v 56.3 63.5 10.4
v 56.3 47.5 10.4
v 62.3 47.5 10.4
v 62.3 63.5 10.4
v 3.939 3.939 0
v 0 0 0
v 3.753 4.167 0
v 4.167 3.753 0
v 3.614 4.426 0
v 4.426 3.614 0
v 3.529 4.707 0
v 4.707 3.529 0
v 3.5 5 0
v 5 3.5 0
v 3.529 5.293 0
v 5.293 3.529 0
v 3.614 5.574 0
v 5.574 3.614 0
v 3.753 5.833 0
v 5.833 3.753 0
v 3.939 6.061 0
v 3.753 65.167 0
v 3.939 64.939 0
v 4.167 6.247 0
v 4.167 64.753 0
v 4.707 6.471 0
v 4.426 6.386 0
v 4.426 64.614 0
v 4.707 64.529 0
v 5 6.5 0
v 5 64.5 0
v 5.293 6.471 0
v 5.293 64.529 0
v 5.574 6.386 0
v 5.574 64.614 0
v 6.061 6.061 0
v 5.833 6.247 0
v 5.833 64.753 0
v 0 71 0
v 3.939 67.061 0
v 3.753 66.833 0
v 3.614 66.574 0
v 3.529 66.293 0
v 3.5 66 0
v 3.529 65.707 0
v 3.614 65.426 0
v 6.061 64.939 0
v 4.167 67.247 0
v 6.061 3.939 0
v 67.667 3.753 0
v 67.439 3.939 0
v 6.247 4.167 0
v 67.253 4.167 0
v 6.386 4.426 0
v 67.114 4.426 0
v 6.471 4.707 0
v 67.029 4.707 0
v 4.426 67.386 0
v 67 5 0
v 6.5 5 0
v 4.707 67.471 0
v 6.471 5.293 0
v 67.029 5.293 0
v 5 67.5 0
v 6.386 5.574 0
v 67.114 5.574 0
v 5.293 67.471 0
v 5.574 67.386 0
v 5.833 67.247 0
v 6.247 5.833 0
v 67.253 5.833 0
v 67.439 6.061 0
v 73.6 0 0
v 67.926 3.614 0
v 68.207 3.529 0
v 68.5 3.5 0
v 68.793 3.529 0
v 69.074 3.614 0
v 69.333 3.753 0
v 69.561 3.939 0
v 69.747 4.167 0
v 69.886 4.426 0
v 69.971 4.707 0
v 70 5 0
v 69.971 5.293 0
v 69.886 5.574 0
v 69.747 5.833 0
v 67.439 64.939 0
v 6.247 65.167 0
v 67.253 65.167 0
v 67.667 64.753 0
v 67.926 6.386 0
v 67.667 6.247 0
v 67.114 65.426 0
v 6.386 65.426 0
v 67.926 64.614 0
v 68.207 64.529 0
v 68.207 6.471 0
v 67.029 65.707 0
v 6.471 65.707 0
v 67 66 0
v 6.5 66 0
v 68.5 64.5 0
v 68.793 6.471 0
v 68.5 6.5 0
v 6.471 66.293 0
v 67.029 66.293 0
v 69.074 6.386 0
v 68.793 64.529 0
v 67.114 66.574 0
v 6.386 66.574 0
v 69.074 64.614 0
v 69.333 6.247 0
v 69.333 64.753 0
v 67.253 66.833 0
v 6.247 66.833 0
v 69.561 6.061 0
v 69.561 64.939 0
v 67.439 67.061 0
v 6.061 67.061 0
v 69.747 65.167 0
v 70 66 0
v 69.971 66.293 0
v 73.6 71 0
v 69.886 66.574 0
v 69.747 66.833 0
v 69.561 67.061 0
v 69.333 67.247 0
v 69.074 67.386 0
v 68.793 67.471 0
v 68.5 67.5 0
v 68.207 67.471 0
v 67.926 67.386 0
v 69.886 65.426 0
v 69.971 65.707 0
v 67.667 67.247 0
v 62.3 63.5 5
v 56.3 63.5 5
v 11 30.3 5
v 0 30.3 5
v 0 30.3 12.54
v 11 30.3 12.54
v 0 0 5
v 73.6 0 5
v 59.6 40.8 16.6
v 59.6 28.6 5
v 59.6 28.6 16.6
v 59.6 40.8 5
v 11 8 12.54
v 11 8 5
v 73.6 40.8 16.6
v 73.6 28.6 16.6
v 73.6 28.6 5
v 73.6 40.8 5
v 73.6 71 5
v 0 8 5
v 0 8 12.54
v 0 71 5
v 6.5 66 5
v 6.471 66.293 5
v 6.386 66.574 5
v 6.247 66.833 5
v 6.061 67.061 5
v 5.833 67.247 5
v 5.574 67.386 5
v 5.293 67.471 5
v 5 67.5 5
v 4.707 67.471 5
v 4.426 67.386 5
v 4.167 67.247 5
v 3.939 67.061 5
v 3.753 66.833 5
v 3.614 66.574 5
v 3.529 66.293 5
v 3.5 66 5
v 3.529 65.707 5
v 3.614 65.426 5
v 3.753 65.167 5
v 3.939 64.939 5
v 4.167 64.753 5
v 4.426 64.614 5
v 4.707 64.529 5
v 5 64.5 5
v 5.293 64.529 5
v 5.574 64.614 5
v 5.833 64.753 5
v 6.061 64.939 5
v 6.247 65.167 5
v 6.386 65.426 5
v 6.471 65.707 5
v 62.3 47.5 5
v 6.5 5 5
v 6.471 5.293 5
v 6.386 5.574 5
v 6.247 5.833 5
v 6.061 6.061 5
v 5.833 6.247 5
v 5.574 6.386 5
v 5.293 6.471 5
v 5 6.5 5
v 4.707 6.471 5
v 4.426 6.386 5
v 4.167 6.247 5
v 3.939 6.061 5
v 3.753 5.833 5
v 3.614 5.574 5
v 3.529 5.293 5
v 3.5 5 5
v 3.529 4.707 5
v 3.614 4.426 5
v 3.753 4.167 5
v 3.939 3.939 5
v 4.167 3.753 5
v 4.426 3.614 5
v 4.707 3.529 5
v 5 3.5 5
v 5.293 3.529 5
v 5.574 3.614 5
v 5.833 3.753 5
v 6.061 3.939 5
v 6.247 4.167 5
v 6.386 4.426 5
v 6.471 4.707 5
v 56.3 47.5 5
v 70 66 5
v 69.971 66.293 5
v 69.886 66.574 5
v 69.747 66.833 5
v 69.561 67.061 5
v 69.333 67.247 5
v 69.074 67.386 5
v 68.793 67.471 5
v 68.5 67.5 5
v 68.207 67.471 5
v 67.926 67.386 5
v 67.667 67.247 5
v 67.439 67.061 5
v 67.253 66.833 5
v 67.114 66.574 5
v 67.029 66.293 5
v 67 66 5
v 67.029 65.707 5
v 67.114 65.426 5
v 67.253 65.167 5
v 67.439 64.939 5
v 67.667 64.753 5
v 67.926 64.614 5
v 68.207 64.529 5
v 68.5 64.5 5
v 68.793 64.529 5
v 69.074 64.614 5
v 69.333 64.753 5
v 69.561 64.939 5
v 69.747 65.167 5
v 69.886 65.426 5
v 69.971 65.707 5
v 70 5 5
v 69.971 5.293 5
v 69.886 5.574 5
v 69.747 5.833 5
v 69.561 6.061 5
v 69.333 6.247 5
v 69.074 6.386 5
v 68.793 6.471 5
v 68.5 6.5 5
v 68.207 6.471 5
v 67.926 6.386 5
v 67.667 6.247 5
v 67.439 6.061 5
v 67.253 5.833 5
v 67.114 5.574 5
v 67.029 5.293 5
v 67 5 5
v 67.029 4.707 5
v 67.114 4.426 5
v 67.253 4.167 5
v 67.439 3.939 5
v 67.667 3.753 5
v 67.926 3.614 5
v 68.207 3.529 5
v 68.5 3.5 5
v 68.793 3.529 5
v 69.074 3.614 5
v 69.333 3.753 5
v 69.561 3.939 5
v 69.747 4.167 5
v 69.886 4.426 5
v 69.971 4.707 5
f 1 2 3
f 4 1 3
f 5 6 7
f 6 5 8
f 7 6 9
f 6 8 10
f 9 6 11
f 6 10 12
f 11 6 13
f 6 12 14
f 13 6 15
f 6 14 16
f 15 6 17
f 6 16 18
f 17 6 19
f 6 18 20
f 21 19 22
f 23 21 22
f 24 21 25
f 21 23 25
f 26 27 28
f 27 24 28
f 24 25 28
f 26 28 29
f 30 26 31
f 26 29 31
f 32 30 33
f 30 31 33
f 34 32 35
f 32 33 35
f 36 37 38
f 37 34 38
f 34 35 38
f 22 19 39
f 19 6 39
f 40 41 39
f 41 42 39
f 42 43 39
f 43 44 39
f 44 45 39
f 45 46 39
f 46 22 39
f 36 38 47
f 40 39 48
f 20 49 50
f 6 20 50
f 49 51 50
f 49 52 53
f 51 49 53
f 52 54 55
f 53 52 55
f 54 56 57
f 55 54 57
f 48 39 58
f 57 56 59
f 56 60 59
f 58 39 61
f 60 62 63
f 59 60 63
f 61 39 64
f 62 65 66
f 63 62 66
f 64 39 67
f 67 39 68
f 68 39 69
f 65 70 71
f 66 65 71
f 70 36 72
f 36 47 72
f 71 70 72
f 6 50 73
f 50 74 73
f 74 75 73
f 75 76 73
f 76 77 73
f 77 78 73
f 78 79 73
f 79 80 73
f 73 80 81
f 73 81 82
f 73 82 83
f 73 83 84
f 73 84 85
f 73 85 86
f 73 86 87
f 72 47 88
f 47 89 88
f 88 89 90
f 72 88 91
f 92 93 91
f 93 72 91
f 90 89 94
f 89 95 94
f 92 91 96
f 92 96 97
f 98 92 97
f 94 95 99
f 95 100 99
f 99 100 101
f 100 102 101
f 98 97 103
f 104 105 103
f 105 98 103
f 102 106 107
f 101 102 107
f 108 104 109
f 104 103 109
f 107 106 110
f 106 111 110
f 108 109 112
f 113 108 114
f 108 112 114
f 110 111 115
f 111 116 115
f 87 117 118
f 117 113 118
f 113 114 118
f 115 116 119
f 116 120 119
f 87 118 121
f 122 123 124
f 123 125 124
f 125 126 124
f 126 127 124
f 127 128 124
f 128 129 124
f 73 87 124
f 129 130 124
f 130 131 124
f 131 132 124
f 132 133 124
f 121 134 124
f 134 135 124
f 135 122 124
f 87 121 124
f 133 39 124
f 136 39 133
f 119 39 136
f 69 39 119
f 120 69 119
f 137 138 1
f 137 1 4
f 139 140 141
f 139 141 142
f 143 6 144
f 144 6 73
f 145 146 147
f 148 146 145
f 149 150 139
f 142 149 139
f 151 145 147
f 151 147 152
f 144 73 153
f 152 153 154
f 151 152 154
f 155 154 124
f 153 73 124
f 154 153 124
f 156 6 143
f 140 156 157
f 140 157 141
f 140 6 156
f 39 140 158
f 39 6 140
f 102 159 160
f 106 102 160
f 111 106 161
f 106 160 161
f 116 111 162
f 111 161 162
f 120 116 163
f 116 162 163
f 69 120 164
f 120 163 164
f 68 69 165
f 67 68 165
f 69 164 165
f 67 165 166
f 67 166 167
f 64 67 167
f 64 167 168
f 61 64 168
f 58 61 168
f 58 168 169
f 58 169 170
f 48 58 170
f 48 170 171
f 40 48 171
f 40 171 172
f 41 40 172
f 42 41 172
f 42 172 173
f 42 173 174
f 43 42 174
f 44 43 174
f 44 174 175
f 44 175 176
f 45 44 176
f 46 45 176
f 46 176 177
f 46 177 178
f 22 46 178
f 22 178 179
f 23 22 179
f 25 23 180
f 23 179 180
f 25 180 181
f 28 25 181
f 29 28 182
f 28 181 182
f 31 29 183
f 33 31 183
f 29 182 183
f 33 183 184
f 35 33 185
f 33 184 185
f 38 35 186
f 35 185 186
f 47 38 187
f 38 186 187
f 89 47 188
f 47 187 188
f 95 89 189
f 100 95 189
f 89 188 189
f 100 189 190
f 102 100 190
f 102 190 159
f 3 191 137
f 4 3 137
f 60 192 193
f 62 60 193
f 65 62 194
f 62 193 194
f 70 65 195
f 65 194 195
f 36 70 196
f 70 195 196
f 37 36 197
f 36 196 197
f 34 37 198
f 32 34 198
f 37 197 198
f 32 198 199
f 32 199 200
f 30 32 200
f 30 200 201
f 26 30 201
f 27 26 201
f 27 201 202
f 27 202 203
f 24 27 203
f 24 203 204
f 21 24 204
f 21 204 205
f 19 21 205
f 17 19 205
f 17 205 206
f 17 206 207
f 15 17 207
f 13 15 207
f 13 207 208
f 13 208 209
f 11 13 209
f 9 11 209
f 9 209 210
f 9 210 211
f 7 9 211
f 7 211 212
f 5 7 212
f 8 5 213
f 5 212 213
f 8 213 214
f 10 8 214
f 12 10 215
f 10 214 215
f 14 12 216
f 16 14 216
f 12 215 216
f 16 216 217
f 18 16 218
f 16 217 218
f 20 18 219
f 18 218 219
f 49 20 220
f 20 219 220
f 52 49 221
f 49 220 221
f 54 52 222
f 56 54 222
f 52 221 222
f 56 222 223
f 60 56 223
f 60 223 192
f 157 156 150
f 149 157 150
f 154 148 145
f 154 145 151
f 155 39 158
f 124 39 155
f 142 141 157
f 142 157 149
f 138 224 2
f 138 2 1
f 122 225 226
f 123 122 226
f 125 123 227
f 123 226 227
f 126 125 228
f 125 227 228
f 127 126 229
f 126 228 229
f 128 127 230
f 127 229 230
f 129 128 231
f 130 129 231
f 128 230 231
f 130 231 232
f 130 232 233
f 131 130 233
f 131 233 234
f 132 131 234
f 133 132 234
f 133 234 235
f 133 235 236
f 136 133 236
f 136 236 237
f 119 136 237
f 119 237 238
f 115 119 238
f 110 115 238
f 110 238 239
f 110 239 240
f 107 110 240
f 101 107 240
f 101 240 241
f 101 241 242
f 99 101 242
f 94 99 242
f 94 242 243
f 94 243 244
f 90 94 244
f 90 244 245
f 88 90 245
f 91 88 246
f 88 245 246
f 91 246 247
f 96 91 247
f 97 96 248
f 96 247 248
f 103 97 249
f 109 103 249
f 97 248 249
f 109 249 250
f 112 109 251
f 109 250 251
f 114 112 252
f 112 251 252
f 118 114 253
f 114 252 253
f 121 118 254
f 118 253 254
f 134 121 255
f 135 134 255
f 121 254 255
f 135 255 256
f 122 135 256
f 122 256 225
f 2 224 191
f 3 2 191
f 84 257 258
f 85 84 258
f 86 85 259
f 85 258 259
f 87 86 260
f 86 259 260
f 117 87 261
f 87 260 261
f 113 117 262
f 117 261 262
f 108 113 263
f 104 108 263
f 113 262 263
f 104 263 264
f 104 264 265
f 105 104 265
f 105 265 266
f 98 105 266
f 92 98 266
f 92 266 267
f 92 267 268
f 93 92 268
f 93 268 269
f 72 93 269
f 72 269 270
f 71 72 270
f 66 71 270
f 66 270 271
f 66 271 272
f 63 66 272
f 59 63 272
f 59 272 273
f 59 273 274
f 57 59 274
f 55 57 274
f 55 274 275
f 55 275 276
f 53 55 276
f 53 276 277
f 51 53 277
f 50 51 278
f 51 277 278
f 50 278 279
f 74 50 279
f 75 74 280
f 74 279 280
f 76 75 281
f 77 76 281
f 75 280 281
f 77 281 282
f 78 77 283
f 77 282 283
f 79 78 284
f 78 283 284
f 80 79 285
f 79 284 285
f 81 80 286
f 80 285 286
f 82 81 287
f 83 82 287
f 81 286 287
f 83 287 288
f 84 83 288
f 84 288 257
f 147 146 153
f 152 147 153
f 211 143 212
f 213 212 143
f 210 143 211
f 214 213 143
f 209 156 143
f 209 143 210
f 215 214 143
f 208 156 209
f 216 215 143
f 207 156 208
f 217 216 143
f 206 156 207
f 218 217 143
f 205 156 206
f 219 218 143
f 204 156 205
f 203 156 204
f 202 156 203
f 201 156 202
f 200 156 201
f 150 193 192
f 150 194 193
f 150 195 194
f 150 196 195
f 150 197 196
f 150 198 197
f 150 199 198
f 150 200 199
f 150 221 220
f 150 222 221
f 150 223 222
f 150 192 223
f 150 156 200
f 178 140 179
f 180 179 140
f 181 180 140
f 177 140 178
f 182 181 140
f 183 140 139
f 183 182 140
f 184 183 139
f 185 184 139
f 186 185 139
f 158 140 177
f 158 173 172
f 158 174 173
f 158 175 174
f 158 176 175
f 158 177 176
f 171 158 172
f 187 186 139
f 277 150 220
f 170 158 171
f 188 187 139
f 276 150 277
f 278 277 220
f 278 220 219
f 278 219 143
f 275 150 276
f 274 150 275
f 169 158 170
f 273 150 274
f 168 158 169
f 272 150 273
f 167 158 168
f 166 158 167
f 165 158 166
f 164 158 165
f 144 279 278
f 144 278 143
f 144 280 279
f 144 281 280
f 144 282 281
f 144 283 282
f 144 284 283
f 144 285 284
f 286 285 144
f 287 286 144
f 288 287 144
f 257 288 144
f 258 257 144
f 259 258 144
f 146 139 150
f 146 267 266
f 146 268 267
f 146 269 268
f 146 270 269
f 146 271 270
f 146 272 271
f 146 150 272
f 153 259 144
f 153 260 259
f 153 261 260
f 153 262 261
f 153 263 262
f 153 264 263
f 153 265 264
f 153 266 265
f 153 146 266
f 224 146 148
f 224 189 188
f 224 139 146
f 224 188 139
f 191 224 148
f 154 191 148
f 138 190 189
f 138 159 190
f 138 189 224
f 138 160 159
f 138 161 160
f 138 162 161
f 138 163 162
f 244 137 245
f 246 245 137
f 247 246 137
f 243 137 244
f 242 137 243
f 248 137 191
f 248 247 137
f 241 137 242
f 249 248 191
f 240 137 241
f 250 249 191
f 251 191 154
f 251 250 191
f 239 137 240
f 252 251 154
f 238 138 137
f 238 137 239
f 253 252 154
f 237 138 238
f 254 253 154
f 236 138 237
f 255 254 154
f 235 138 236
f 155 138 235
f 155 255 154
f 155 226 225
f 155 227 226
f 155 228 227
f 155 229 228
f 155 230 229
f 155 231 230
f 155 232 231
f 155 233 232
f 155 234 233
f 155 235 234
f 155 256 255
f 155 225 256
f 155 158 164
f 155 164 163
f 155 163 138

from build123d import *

# Parameters (mm, degrees)
SKETCH1_W           = 73.6
SKETCH1_H           = 71
BOSS_EXTRUDE1_DEPTH = 5
SKETCH2_R           = 1.5
CUT_EXTRUDE1_DEPTH  = 6
SKETCH3_W           = 11
SKETCH3_H           = 22.3
BOSS_EXTRUDE2_DEPTH = 7.54
SKETCH4_W           = 14
SKETCH4_H           = 12.2
BOSS_EXTRUDE3_DEPTH = 11.6
SKETCH5_W           = 6
SKETCH5_H           = 16
BOSS_EXTRUDE4_DEPTH = 5.4


with BuildPart() as part:
    # Sketch1 → Boss-Extrude1 (new body)
    with BuildSketch(Plane.XY):
        with Locations((36.8, 35.5)):
            Rectangle(SKETCH1_W, SKETCH1_H)
    extrude(amount=BOSS_EXTRUDE1_DEPTH)

    # Sketch2 → Cut-Extrude1 (cut, through all)
    with BuildSketch(Plane.XY.offset(5)):
        with Locations((5, 5)):
            Circle(SKETCH2_R)
        with Locations((68.5, 5)):
            Circle(SKETCH2_R)
        with Locations((68.5, 66)):
            Circle(SKETCH2_R)
        with Locations((5, 66)):
            Circle(SKETCH2_R)
    extrude(amount=-CUT_EXTRUDE1_DEPTH, mode=Mode.SUBTRACT)

    # Sketch3 → Boss-Extrude2 (add)
    with BuildSketch(Plane.XY.offset(5)):
        with Locations((5.5, 19.15)):
            Rectangle(SKETCH3_W, SKETCH3_H)
    extrude(amount=BOSS_EXTRUDE2_DEPTH)

    # Sketch4 → Boss-Extrude3 (add)
    with BuildSketch(Plane.XY.offset(5)):
        with Locations((66.6, 34.7)):
            Rectangle(SKETCH4_W, SKETCH4_H)
    extrude(amount=BOSS_EXTRUDE3_DEPTH)

    # Sketch5 → Boss-Extrude4 (add)
    with BuildSketch(Plane.XY.offset(5)):
        with Locations((59.3, 55.5)):
            Rectangle(SKETCH5_W, SKETCH5_H)
    extrude(amount=BOSS_EXTRUDE4_DEPTH)


solid = part.part
